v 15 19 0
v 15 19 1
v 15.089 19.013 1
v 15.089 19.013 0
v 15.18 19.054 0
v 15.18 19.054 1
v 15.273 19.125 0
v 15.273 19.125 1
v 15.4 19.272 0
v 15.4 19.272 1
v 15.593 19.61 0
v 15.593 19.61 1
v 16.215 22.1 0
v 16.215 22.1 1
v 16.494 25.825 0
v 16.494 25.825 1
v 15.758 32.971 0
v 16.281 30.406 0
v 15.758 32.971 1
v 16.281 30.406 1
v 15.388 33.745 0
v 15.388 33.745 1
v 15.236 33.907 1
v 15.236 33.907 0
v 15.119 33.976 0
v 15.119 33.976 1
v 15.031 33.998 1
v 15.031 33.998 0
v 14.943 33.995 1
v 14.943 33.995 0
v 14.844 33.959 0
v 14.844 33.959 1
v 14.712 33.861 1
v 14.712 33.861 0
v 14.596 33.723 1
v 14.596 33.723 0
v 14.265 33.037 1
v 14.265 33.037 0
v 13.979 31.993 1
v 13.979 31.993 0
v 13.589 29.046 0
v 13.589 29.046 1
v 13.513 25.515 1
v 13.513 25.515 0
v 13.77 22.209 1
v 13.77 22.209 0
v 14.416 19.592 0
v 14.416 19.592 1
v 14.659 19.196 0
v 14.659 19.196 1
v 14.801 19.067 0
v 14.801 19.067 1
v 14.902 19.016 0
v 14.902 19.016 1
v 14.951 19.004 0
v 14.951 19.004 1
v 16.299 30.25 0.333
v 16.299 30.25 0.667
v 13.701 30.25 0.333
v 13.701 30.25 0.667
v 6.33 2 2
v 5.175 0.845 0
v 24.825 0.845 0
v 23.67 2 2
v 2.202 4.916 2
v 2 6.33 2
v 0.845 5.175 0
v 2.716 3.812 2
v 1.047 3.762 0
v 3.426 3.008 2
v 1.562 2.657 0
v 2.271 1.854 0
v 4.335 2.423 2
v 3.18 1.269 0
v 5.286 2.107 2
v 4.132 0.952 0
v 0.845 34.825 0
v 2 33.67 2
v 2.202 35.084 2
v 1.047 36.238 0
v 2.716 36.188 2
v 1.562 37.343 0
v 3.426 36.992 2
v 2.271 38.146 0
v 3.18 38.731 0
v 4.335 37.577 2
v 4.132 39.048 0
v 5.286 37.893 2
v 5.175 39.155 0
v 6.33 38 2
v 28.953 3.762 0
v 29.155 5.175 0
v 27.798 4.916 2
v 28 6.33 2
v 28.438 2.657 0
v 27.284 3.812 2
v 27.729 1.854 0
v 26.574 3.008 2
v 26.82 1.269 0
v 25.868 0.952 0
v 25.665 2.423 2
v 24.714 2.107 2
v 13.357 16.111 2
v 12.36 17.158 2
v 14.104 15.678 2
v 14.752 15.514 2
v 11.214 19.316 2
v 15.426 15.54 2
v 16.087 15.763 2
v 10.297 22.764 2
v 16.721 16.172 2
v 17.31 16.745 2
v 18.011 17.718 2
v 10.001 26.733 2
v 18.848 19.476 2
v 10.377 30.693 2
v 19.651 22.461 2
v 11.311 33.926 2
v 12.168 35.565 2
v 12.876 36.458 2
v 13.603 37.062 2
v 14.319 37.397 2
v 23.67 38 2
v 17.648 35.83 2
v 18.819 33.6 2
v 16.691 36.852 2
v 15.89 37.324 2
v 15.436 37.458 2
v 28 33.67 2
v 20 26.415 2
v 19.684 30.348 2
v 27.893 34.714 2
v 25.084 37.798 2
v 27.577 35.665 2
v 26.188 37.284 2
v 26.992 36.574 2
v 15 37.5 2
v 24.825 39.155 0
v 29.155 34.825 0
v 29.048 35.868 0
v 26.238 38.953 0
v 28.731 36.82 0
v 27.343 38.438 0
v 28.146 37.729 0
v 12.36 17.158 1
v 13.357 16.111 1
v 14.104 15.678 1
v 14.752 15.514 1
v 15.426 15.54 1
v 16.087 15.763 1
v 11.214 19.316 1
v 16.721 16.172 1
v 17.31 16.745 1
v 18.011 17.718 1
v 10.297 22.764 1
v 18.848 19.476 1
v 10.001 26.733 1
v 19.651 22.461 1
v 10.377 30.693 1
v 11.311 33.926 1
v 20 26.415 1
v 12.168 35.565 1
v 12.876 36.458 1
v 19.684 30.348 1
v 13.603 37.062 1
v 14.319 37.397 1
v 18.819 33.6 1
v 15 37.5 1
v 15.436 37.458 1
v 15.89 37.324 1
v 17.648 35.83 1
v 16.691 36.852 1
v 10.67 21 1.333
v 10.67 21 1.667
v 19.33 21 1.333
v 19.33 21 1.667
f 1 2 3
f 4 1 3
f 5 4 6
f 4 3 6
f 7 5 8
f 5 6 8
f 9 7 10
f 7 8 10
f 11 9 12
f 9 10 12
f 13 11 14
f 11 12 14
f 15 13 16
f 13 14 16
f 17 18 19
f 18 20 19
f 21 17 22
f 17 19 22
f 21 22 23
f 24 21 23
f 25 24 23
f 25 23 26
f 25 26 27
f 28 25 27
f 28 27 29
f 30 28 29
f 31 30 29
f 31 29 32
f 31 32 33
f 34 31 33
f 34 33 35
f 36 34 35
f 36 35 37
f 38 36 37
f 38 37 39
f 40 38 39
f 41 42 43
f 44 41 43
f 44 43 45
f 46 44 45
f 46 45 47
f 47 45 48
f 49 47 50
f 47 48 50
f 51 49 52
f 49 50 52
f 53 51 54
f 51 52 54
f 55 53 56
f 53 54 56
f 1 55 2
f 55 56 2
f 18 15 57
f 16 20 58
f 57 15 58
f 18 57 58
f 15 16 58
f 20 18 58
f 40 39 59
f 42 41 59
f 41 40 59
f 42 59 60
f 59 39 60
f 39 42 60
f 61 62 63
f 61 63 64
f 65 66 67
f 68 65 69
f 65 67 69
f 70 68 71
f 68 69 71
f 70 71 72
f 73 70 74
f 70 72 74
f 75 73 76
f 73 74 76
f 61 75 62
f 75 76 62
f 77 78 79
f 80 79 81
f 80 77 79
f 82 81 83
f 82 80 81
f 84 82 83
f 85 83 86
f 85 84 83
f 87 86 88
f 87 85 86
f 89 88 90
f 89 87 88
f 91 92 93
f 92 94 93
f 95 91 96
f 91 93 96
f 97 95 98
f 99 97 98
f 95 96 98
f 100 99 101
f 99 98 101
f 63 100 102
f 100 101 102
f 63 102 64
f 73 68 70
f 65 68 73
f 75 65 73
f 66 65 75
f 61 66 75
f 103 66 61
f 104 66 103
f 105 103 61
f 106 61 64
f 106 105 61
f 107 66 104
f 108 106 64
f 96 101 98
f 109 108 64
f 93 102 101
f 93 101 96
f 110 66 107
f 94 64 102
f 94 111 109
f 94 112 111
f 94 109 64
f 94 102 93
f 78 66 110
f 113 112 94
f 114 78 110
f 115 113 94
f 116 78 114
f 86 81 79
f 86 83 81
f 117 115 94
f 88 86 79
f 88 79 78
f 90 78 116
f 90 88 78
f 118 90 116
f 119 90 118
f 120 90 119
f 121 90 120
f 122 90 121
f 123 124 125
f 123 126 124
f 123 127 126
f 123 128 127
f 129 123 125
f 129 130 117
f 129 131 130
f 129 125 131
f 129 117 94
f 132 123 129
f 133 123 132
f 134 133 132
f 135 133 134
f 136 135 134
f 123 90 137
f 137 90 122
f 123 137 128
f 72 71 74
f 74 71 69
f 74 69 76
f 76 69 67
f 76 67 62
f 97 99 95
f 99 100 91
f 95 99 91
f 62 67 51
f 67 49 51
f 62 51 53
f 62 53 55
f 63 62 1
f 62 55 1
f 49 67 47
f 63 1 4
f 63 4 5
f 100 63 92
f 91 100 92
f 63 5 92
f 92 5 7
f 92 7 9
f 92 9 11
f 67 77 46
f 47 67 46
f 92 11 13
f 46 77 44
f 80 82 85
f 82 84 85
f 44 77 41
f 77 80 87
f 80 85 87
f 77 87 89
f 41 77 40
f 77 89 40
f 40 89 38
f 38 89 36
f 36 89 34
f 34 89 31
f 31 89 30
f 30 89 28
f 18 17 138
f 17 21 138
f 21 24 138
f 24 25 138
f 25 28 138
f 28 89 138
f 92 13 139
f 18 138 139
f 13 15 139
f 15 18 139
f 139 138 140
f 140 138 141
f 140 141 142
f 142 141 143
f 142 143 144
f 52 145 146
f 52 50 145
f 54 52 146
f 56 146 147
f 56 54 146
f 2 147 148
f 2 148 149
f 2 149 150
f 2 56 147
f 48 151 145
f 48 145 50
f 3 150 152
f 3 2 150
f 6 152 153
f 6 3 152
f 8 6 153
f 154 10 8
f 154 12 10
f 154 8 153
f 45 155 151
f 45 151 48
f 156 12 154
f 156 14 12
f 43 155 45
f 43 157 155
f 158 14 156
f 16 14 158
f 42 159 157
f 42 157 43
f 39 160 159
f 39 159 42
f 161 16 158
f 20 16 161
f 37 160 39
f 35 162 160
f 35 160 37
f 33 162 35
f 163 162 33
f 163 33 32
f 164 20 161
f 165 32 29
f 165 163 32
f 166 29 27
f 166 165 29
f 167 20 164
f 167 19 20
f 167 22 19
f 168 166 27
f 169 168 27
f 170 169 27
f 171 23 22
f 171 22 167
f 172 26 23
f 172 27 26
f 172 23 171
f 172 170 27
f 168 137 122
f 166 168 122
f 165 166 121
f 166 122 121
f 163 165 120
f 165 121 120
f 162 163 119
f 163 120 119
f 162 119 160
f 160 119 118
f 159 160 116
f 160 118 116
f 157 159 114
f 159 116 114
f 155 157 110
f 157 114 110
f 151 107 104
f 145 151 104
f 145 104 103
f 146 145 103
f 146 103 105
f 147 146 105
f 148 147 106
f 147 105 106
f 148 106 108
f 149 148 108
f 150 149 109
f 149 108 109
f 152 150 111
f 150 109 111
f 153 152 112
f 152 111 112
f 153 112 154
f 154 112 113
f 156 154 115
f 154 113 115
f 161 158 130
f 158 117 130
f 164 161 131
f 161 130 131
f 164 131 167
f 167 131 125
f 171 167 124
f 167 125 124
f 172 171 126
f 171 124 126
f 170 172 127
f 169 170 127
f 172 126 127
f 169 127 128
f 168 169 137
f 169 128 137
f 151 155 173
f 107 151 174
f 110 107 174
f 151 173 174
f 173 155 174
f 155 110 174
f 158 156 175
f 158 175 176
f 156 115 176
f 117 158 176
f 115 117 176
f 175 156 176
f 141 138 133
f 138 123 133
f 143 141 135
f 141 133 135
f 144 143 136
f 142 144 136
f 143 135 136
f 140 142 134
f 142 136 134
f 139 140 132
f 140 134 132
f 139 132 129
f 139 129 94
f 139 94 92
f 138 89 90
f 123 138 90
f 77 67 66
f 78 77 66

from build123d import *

# Parameters (mm, degrees)
F0_W        = 30
F0_H        = 40
F1_DEPTH    = 2
F3_DEPTH    = 1
F4_DEPTH    = 2
F5_T1_DEPTH = 47.9238558823
F5_T3_DEPTH = 57.9238558823
F6_R        = 5


# Not quite as in the source:
# - a fillet or chamfer that OpenCascade refuses, or shapes differently, is made with other operations: its cross-section is extruded or revolved along the edge and cut away or added


with BuildPart() as f1:
    # F0 (on Top) → F1 (new body)
    with BuildSketch(Plane.XY):
        with Locations((15, 20)):
            Rectangle(F0_W, F0_H)
    extrude(amount=F1_DEPTH)

    # F2 (on face) → F3 (cut)
    with BuildSketch(Plane.XY.offset(2)):
        with BuildLine():
            add(Edge.make_bspline(
                [(15, 37.5), (6.3397459622, 37.5), (10.6698729811, 21), (15, 4.5), (19.3301270189, 21), (23.6602540378, 37.5), (15, 37.5)],
                knots=[0, 0, 0, 2.0943951024, 2.0943951024, 4.1887902048, 4.1887902048, 6.2831853072, 6.2831853072, 6.2831853072], degree=2, weights=[1, 0.5, 1, 0.5, 1, 0.5, 1]))
        make_face()
        with BuildLine():
            add(Edge.make_bspline(
                [(15, 19), (17.5980762114, 19), (16.2990381057, 30.25), (15, 41.5), (13.7009618943, 30.25), (12.4019237886, 19), (15, 19)],
                knots=[0, 0, 0, 2.0943951024, 2.0943951024, 4.1887902048, 4.1887902048, 6.2831853072, 6.2831853072, 6.2831853072], degree=2, weights=[1, 0.5, 1, 0.5, 1, 0.5, 1]))
        make_face(mode=Mode.SUBTRACT)
    extrude(amount=-F3_DEPTH, mode=Mode.SUBTRACT)

    # F4 (cut): a face of the model
    f4_faces = [f1.faces().sort_by_distance(p)[0] for p in [
        (15, 26.5181913431, 2),
    ]]
    extrude(f4_faces, amount=-F4_DEPTH, mode=Mode.SUBTRACT)

    # F5: chamfer of 2 x 3.4641016151 on 4 edges, made by hand

    # F5_s2 → F5_t1 (cut)
    with BuildSketch(Plane.YZ.offset(-8.9619279412)):
        Polygon((0, -1.4641016151), (2, 2), (0, 2), align=None)
        Polygon((40, -1.4641016151), (38, 2), (40, 2), align=None)
    extrude(amount=F5_T1_DEPTH, mode=Mode.SUBTRACT)

    # F5_s4 → F5_t3 (cut)
    with BuildSketch(Plane.XZ.offset(-48.9619279412)):
        Polygon((28, 2), (30, -1.4641016151), (30, 2), align=None)
        Polygon((0, -1.4641016151), (2, 2), (0, 2), align=None)
    extrude(amount=F5_T3_DEPTH, mode=Mode.SUBTRACT)

    # F6
    f6_edges = [f1.edges().sort_by_distance(p)[0] for p in [
        (28.57735, 38.57735, 1),
        (28.57735, 1.42265, 1),
        (1.42265, 1.42265, 1),
        (1.42265, 38.57735, 1),
    ]]
    fillet(f6_edges, radius=F6_R)


solid = f1.part
